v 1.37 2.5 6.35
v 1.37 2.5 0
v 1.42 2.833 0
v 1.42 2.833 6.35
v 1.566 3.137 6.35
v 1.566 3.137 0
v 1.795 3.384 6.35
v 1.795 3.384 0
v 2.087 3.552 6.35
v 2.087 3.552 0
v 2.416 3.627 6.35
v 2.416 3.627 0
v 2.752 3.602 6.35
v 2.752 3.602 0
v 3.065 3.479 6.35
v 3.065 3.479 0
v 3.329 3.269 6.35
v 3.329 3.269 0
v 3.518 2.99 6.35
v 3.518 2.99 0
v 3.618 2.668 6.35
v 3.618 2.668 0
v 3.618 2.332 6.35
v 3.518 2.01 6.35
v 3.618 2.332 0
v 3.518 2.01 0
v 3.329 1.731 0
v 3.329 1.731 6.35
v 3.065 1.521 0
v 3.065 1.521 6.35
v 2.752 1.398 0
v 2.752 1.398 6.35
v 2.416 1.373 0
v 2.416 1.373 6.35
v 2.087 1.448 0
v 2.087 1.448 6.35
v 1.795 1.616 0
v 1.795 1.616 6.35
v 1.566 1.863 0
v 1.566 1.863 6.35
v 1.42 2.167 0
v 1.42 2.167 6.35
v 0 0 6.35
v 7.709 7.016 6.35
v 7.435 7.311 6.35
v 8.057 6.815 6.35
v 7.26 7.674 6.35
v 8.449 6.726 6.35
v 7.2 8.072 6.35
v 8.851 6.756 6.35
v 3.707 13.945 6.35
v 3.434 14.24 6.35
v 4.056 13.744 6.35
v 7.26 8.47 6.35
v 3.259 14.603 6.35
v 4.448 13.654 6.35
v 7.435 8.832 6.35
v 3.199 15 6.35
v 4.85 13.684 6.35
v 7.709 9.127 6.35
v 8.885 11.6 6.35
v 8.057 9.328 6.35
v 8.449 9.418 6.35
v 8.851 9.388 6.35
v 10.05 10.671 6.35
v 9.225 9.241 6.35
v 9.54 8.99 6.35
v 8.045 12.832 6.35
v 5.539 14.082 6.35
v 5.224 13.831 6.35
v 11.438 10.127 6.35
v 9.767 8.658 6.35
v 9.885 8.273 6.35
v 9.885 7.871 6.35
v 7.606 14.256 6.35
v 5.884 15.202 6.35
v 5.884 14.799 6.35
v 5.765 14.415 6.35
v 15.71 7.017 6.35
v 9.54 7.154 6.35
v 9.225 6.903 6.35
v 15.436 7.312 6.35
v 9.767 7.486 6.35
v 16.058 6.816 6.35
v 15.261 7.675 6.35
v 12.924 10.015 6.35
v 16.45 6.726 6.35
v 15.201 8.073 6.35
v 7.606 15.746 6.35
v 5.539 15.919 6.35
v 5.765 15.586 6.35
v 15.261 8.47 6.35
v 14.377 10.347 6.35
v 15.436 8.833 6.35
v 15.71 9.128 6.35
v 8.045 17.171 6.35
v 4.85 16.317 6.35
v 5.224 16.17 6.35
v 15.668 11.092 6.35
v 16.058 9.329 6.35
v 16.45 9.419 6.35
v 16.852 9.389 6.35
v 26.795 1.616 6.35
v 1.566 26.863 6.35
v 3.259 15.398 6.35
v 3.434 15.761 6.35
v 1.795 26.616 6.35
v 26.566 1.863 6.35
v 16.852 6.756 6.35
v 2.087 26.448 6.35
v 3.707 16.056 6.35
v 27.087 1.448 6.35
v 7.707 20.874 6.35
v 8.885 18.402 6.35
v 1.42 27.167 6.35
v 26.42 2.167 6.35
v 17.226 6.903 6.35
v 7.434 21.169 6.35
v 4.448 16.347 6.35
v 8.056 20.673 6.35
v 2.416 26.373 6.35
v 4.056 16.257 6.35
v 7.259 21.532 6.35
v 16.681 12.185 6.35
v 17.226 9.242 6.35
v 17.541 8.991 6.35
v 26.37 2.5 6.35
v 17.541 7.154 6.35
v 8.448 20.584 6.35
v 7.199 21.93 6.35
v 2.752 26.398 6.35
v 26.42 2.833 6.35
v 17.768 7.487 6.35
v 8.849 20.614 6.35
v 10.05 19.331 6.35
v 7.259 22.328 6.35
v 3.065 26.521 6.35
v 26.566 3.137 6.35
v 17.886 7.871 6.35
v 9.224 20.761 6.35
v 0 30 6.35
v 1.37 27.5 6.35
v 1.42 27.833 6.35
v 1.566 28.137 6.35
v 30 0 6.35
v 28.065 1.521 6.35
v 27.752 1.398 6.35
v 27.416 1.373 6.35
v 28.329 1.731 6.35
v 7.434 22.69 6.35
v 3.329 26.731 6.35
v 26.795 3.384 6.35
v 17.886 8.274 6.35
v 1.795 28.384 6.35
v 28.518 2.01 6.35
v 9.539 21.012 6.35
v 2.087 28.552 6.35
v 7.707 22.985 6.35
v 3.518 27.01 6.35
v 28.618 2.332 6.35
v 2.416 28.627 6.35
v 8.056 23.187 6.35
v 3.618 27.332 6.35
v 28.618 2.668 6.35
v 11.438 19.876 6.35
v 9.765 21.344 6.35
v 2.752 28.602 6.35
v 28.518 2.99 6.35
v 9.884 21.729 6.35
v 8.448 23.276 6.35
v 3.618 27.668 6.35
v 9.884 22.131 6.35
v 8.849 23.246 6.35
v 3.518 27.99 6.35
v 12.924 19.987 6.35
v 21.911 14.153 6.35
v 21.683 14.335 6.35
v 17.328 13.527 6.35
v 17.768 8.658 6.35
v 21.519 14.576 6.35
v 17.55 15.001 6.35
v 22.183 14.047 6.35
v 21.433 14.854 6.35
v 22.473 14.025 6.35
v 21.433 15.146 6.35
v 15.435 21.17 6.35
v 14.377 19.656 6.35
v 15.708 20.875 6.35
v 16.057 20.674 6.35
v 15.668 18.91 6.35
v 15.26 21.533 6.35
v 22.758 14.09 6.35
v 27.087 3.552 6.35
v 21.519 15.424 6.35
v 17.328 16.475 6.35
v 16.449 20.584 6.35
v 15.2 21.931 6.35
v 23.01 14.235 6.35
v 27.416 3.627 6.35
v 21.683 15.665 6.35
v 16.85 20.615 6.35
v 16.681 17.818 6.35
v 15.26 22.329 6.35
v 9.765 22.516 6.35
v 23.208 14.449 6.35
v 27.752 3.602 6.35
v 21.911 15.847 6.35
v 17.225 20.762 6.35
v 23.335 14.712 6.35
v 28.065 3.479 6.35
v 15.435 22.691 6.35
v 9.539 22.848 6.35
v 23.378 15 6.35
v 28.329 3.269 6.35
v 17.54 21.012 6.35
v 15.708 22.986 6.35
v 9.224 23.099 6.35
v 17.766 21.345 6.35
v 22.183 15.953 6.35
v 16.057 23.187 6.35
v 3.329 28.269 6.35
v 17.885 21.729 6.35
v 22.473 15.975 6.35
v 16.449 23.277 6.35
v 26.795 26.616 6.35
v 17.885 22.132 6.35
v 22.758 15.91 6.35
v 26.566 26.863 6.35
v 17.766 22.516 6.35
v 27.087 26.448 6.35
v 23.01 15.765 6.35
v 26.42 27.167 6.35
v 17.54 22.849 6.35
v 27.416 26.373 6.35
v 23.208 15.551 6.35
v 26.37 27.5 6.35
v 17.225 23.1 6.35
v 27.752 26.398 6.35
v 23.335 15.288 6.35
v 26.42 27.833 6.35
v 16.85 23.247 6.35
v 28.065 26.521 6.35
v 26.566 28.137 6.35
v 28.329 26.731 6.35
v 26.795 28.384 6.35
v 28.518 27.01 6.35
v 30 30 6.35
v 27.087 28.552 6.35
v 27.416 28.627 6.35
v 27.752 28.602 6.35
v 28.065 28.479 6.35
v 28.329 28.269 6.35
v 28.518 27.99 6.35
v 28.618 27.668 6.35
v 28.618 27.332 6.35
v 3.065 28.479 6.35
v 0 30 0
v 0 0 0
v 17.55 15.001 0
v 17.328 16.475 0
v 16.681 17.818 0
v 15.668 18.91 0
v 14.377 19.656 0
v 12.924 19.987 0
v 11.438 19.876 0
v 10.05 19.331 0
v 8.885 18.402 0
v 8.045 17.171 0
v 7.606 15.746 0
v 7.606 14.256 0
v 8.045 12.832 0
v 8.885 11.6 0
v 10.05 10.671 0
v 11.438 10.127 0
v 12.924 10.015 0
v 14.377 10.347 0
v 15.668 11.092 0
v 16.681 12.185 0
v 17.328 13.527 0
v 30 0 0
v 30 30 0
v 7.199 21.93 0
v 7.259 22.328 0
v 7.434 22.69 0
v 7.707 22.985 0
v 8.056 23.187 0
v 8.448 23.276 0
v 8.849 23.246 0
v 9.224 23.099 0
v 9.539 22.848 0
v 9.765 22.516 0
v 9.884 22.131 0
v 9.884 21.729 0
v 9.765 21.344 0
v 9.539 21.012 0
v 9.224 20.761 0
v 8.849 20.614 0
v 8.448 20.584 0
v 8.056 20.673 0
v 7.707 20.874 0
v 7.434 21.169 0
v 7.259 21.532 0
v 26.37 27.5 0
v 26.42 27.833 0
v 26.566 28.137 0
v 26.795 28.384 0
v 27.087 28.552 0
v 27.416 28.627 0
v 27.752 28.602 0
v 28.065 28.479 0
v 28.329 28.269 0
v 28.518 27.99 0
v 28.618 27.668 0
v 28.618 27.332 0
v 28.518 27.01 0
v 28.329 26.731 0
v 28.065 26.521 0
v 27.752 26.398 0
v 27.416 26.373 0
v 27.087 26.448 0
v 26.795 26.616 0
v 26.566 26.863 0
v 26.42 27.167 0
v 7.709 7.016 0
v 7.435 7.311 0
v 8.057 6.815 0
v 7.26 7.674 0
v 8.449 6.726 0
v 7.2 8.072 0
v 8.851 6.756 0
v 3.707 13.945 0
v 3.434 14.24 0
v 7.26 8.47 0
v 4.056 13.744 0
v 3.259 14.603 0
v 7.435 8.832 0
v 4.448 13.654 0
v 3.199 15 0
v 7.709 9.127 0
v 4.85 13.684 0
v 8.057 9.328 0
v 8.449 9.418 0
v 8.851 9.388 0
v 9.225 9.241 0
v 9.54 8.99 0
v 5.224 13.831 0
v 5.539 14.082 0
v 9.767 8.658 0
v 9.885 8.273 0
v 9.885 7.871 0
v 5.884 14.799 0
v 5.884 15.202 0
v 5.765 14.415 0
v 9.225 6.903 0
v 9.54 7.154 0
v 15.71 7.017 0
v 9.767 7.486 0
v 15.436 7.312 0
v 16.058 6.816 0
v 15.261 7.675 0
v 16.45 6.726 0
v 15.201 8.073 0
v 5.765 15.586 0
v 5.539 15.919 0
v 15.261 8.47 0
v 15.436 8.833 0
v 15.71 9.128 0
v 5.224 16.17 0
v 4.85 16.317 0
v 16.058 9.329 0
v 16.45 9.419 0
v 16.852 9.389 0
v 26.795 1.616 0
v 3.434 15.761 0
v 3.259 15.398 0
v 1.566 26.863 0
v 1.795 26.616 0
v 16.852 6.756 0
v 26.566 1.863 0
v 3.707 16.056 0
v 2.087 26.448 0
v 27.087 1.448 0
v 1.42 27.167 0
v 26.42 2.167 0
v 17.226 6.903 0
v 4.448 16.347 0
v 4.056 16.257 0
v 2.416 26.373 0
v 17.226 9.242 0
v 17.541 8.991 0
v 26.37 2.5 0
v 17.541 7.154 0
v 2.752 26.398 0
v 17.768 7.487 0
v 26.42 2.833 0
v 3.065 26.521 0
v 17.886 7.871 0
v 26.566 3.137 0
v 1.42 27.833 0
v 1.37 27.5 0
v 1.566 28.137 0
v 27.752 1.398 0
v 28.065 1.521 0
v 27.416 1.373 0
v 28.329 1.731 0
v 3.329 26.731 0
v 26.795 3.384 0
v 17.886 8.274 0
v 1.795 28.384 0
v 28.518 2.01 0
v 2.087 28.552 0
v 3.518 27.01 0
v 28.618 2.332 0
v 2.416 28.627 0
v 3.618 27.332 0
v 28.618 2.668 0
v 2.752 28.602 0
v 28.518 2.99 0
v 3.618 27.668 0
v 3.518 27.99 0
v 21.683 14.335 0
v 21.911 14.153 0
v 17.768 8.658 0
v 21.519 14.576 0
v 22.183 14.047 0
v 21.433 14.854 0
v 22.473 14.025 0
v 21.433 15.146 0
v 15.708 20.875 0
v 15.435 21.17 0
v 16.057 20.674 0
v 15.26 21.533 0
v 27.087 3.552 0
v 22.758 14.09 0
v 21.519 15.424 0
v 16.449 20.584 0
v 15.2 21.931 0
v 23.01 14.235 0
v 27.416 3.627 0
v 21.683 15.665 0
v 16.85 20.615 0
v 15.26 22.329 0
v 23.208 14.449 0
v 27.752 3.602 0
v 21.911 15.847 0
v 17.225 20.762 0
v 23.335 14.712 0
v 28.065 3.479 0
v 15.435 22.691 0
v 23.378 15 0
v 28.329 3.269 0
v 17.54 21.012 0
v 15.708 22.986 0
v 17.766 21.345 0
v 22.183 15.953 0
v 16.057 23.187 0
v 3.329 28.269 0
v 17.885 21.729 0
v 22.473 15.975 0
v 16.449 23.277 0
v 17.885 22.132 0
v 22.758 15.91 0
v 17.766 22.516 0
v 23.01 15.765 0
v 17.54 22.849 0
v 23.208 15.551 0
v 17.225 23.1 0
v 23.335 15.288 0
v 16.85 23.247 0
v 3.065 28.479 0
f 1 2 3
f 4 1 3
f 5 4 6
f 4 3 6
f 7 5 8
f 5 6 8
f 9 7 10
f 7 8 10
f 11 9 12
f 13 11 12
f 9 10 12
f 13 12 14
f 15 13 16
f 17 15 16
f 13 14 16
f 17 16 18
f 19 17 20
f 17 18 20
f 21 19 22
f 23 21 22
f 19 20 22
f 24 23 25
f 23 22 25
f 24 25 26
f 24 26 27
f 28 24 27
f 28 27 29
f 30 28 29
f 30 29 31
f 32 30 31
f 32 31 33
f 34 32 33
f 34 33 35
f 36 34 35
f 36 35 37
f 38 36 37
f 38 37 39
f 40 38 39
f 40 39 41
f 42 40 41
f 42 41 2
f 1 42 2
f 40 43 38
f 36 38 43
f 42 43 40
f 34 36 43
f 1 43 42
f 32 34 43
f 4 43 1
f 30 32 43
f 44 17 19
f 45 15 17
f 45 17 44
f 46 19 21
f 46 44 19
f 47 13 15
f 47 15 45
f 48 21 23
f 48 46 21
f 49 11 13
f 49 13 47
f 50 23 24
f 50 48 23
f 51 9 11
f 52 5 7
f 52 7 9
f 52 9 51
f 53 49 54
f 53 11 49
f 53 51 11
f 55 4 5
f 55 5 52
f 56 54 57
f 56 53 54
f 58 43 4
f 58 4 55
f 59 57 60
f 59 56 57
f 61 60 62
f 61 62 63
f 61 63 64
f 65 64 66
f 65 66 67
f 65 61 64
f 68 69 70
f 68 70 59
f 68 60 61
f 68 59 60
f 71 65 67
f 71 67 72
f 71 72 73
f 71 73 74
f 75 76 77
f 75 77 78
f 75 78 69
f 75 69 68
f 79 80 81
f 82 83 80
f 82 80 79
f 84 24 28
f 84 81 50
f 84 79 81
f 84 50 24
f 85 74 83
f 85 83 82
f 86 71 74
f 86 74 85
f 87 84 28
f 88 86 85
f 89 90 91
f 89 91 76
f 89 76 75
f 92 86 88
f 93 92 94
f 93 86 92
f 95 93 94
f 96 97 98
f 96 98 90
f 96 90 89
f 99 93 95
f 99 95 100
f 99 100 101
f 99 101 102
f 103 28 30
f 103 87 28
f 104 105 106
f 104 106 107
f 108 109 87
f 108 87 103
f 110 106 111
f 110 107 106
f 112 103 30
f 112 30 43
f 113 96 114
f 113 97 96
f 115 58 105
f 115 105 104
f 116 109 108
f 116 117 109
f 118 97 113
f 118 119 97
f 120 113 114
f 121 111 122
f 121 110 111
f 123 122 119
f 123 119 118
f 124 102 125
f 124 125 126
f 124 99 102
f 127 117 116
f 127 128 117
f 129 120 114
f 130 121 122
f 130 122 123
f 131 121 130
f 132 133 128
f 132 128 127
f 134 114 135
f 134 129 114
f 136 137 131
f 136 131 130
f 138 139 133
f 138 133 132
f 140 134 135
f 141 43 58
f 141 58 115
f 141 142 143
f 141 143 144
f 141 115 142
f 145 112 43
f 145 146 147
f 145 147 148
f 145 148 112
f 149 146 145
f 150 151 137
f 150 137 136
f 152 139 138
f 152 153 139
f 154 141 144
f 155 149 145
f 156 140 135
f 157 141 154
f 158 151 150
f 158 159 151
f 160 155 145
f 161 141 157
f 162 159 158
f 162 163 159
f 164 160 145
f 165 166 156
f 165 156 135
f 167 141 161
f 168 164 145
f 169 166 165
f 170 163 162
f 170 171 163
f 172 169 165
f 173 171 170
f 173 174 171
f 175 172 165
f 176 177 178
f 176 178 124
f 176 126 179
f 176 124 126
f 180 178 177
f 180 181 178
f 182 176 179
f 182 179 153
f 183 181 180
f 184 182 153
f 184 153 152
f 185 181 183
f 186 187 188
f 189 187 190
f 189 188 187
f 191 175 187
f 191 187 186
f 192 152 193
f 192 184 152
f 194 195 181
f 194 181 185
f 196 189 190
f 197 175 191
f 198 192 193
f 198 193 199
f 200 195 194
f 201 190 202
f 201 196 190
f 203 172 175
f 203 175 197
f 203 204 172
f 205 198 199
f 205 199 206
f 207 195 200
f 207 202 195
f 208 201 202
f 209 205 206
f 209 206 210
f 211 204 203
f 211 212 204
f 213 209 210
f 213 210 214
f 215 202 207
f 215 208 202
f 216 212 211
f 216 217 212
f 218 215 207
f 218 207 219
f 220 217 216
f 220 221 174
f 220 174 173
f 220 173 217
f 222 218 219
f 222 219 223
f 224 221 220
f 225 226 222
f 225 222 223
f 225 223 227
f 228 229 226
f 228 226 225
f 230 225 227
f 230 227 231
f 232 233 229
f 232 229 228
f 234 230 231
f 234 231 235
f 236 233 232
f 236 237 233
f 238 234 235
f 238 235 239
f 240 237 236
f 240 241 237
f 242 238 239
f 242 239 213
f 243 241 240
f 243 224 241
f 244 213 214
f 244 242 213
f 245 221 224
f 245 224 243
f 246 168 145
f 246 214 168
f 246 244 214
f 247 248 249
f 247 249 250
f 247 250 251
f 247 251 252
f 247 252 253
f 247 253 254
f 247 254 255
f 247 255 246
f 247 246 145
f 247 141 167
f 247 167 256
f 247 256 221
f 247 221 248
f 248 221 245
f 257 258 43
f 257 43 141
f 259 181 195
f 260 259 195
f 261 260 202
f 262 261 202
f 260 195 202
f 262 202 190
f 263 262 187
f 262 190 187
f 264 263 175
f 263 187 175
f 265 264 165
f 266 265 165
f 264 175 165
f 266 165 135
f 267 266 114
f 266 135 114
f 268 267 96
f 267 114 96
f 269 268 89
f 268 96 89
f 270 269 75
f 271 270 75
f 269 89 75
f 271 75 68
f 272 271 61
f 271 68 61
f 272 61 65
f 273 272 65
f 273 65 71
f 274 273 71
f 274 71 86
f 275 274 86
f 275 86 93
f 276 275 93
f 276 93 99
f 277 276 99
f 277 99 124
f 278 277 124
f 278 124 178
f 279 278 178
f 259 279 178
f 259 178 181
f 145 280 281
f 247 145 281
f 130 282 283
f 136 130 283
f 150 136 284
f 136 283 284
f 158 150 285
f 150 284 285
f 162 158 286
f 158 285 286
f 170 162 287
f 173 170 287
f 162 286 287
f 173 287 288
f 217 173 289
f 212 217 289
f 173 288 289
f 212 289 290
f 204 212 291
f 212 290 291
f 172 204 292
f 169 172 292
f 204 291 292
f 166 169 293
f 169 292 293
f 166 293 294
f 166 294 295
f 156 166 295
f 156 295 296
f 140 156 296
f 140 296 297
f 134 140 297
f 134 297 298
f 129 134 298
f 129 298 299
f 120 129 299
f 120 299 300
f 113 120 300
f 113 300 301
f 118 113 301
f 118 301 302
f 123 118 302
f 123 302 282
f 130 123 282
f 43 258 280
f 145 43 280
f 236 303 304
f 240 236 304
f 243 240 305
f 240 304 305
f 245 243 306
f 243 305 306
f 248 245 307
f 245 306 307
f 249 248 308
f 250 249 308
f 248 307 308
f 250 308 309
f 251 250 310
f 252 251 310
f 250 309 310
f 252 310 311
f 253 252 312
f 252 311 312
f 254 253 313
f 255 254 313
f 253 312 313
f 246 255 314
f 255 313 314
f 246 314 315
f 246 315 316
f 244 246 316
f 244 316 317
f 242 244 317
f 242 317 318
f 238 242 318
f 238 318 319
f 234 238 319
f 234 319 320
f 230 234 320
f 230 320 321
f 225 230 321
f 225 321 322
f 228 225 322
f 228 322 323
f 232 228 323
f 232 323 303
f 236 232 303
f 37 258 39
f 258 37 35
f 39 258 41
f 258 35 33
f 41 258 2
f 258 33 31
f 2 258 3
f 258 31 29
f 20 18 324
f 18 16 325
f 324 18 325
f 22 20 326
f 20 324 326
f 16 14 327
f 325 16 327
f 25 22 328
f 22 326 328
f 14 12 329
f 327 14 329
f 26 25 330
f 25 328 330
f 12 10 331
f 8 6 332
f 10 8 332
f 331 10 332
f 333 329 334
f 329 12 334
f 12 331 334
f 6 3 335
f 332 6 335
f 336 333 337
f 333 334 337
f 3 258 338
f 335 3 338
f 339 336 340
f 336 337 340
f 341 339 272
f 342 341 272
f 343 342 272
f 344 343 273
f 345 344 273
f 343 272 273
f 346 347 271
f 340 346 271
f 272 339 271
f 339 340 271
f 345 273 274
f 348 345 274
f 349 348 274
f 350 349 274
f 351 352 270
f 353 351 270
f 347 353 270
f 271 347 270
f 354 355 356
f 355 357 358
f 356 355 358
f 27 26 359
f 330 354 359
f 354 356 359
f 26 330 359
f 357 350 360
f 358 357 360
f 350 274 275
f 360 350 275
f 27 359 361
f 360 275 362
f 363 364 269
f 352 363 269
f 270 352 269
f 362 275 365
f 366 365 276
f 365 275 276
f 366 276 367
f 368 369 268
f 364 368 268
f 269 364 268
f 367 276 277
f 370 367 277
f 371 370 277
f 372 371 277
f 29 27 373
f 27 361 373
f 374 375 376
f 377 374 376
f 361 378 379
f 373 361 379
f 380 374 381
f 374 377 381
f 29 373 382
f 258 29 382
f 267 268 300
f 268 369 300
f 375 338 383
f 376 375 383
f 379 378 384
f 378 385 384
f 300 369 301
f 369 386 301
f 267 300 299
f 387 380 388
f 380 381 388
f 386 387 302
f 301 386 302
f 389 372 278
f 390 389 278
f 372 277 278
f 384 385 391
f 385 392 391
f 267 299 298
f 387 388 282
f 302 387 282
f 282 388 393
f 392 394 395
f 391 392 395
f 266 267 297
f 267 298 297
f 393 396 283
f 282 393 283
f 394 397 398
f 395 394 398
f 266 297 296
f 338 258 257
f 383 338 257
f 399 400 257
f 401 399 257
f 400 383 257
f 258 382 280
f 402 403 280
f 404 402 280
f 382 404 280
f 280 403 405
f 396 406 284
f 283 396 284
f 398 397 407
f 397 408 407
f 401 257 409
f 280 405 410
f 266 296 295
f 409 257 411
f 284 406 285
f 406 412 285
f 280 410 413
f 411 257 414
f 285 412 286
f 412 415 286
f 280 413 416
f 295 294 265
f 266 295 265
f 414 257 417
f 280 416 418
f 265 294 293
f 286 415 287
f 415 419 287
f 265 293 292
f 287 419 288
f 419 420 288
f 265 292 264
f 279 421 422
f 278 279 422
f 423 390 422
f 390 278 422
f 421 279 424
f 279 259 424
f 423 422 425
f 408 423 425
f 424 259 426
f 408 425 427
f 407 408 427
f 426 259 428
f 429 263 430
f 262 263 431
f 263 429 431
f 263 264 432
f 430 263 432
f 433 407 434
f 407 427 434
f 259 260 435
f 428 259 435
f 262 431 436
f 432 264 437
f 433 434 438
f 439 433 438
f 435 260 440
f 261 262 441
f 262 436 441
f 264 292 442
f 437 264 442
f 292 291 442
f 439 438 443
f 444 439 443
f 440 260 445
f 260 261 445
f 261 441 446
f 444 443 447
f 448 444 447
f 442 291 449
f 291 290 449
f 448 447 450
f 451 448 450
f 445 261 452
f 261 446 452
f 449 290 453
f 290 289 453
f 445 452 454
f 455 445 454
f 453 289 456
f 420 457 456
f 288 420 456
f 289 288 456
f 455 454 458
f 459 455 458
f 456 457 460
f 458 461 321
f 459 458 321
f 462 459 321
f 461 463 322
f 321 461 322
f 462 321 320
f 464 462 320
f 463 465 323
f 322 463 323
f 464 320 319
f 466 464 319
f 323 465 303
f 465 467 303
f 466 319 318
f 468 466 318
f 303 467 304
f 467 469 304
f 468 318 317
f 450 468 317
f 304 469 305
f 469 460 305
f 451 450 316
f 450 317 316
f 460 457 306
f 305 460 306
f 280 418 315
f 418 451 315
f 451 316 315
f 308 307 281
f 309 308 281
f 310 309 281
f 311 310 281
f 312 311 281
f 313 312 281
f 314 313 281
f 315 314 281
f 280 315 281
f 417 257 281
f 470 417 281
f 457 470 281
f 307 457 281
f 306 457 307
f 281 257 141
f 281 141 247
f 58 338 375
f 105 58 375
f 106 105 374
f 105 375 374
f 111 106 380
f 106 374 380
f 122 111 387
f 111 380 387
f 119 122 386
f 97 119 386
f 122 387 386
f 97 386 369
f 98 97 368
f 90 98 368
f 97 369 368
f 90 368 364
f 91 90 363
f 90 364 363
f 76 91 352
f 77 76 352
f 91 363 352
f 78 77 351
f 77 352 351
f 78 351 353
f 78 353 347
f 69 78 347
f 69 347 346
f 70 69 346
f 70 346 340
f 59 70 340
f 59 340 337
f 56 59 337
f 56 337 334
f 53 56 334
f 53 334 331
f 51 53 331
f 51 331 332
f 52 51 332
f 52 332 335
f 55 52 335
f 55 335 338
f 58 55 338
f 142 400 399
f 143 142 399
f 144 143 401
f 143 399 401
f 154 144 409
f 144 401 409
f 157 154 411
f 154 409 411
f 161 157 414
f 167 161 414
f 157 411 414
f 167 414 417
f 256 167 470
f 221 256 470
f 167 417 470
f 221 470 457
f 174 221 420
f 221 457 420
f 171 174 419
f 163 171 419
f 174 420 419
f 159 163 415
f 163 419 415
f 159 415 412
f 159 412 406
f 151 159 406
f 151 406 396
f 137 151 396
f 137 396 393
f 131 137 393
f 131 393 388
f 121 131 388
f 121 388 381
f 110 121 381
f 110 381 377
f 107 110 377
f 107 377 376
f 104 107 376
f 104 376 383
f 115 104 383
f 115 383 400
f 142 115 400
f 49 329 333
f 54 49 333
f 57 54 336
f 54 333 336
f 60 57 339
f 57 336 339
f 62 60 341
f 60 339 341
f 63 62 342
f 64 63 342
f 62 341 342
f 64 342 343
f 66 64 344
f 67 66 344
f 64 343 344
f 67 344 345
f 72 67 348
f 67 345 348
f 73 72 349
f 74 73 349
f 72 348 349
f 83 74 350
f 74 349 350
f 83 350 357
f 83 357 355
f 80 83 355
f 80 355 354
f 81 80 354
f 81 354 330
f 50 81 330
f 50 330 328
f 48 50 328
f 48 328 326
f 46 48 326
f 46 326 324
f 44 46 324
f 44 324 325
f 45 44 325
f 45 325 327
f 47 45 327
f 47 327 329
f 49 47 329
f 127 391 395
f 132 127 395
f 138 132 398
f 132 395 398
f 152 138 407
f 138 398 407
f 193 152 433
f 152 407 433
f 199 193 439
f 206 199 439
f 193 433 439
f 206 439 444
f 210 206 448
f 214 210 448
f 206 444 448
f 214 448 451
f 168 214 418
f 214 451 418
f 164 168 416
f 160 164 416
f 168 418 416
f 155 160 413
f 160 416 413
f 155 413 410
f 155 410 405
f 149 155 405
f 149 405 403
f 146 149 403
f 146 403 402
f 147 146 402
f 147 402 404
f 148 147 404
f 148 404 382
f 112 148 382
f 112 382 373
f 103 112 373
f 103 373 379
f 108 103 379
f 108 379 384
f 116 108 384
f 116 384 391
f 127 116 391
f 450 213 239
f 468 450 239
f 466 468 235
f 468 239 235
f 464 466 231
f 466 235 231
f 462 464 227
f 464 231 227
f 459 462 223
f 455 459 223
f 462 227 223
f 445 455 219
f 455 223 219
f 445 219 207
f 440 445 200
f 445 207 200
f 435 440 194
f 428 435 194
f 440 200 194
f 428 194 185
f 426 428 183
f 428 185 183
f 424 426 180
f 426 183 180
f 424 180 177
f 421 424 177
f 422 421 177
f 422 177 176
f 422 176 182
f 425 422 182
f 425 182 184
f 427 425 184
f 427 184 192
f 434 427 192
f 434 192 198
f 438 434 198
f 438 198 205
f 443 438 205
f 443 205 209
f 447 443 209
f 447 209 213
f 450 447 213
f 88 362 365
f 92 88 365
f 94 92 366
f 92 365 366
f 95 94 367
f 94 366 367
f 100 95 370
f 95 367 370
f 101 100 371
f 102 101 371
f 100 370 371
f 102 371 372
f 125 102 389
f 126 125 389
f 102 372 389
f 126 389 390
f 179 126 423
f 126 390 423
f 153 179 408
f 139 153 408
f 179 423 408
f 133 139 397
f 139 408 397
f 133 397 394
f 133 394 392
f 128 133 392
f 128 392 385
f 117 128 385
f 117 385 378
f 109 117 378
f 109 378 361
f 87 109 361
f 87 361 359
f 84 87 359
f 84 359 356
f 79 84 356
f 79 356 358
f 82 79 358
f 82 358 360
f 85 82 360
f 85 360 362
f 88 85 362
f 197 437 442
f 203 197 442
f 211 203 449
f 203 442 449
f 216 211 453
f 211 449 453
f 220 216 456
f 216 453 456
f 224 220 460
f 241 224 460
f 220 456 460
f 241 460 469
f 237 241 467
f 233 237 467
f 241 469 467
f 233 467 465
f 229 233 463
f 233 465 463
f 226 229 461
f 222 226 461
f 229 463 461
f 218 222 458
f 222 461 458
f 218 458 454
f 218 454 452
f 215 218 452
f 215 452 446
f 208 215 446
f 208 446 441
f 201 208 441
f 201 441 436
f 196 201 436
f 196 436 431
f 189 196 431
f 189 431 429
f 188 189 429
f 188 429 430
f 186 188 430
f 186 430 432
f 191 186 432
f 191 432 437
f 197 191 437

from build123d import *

# Parameters (mm, degrees)
SKETCH1_W              = 30
SKETCH1_H              = 30
BOSS_EXTRUDE1_DEPTH    = 6.35
F_2_CLEARANCE_HOLE1_D  = 2.2606
SKETCH4_R              = 4.99999
CUT_EXTRUDE1_DEPTH     = 43.898980174
M2_5_CLEARANCE_HOLE1_D = 2.7
SKETCH9_R              = 0.9779
CUT_EXTRUDE2_DEPTH     = 43.898980174


with BuildPart() as part:
    # Sketch1 → Boss-Extrude1 (new body)
    with BuildSketch(Plane.XY):
        with Locations((15, 15)):
            Rectangle(SKETCH1_W, SKETCH1_H)
    extrude(amount=BOSS_EXTRUDE1_DEPTH)

    # #2 Clearance Hole1 (through all)
    with Locations(Plane.XY.offset(6.35)):
        with Locations((2.5, 27.5), (27.5, 27.5), (2.5, 2.5), (27.5, 2.5)):
            Hole(F_2_CLEARANCE_HOLE1_D / 2)

    # Sketch4 → Cut-Extrude1 (cut, through all)
    with BuildSketch(Plane.XY.offset(6.35)):
        with Locations((12.55014, 15.00124)):
            Circle(SKETCH4_R)
    extrude(amount=-CUT_EXTRUDE1_DEPTH, mode=Mode.SUBTRACT)

    # M2.5 Clearance Hole1 (through all)
    with Locations(Plane.XY.offset(6.35)):
        with Locations((16.551324598, 8.072566042), (8.550324637, 8.071775514), (4.549140039, 15.000449472), (8.548955402, 21.929913958), (16.549955363, 21.930704486)):
            Hole(M2_5_CLEARANCE_HOLE1_D / 2)

    # Sketch9 → Cut-Extrude2 (cut, through all)
    with BuildSketch(Plane.XY.offset(6.35)):
        with Locations((22.40032, 15)):
            Circle(SKETCH9_R)
    extrude(amount=-CUT_EXTRUDE2_DEPTH, mode=Mode.SUBTRACT)


solid = part.part
